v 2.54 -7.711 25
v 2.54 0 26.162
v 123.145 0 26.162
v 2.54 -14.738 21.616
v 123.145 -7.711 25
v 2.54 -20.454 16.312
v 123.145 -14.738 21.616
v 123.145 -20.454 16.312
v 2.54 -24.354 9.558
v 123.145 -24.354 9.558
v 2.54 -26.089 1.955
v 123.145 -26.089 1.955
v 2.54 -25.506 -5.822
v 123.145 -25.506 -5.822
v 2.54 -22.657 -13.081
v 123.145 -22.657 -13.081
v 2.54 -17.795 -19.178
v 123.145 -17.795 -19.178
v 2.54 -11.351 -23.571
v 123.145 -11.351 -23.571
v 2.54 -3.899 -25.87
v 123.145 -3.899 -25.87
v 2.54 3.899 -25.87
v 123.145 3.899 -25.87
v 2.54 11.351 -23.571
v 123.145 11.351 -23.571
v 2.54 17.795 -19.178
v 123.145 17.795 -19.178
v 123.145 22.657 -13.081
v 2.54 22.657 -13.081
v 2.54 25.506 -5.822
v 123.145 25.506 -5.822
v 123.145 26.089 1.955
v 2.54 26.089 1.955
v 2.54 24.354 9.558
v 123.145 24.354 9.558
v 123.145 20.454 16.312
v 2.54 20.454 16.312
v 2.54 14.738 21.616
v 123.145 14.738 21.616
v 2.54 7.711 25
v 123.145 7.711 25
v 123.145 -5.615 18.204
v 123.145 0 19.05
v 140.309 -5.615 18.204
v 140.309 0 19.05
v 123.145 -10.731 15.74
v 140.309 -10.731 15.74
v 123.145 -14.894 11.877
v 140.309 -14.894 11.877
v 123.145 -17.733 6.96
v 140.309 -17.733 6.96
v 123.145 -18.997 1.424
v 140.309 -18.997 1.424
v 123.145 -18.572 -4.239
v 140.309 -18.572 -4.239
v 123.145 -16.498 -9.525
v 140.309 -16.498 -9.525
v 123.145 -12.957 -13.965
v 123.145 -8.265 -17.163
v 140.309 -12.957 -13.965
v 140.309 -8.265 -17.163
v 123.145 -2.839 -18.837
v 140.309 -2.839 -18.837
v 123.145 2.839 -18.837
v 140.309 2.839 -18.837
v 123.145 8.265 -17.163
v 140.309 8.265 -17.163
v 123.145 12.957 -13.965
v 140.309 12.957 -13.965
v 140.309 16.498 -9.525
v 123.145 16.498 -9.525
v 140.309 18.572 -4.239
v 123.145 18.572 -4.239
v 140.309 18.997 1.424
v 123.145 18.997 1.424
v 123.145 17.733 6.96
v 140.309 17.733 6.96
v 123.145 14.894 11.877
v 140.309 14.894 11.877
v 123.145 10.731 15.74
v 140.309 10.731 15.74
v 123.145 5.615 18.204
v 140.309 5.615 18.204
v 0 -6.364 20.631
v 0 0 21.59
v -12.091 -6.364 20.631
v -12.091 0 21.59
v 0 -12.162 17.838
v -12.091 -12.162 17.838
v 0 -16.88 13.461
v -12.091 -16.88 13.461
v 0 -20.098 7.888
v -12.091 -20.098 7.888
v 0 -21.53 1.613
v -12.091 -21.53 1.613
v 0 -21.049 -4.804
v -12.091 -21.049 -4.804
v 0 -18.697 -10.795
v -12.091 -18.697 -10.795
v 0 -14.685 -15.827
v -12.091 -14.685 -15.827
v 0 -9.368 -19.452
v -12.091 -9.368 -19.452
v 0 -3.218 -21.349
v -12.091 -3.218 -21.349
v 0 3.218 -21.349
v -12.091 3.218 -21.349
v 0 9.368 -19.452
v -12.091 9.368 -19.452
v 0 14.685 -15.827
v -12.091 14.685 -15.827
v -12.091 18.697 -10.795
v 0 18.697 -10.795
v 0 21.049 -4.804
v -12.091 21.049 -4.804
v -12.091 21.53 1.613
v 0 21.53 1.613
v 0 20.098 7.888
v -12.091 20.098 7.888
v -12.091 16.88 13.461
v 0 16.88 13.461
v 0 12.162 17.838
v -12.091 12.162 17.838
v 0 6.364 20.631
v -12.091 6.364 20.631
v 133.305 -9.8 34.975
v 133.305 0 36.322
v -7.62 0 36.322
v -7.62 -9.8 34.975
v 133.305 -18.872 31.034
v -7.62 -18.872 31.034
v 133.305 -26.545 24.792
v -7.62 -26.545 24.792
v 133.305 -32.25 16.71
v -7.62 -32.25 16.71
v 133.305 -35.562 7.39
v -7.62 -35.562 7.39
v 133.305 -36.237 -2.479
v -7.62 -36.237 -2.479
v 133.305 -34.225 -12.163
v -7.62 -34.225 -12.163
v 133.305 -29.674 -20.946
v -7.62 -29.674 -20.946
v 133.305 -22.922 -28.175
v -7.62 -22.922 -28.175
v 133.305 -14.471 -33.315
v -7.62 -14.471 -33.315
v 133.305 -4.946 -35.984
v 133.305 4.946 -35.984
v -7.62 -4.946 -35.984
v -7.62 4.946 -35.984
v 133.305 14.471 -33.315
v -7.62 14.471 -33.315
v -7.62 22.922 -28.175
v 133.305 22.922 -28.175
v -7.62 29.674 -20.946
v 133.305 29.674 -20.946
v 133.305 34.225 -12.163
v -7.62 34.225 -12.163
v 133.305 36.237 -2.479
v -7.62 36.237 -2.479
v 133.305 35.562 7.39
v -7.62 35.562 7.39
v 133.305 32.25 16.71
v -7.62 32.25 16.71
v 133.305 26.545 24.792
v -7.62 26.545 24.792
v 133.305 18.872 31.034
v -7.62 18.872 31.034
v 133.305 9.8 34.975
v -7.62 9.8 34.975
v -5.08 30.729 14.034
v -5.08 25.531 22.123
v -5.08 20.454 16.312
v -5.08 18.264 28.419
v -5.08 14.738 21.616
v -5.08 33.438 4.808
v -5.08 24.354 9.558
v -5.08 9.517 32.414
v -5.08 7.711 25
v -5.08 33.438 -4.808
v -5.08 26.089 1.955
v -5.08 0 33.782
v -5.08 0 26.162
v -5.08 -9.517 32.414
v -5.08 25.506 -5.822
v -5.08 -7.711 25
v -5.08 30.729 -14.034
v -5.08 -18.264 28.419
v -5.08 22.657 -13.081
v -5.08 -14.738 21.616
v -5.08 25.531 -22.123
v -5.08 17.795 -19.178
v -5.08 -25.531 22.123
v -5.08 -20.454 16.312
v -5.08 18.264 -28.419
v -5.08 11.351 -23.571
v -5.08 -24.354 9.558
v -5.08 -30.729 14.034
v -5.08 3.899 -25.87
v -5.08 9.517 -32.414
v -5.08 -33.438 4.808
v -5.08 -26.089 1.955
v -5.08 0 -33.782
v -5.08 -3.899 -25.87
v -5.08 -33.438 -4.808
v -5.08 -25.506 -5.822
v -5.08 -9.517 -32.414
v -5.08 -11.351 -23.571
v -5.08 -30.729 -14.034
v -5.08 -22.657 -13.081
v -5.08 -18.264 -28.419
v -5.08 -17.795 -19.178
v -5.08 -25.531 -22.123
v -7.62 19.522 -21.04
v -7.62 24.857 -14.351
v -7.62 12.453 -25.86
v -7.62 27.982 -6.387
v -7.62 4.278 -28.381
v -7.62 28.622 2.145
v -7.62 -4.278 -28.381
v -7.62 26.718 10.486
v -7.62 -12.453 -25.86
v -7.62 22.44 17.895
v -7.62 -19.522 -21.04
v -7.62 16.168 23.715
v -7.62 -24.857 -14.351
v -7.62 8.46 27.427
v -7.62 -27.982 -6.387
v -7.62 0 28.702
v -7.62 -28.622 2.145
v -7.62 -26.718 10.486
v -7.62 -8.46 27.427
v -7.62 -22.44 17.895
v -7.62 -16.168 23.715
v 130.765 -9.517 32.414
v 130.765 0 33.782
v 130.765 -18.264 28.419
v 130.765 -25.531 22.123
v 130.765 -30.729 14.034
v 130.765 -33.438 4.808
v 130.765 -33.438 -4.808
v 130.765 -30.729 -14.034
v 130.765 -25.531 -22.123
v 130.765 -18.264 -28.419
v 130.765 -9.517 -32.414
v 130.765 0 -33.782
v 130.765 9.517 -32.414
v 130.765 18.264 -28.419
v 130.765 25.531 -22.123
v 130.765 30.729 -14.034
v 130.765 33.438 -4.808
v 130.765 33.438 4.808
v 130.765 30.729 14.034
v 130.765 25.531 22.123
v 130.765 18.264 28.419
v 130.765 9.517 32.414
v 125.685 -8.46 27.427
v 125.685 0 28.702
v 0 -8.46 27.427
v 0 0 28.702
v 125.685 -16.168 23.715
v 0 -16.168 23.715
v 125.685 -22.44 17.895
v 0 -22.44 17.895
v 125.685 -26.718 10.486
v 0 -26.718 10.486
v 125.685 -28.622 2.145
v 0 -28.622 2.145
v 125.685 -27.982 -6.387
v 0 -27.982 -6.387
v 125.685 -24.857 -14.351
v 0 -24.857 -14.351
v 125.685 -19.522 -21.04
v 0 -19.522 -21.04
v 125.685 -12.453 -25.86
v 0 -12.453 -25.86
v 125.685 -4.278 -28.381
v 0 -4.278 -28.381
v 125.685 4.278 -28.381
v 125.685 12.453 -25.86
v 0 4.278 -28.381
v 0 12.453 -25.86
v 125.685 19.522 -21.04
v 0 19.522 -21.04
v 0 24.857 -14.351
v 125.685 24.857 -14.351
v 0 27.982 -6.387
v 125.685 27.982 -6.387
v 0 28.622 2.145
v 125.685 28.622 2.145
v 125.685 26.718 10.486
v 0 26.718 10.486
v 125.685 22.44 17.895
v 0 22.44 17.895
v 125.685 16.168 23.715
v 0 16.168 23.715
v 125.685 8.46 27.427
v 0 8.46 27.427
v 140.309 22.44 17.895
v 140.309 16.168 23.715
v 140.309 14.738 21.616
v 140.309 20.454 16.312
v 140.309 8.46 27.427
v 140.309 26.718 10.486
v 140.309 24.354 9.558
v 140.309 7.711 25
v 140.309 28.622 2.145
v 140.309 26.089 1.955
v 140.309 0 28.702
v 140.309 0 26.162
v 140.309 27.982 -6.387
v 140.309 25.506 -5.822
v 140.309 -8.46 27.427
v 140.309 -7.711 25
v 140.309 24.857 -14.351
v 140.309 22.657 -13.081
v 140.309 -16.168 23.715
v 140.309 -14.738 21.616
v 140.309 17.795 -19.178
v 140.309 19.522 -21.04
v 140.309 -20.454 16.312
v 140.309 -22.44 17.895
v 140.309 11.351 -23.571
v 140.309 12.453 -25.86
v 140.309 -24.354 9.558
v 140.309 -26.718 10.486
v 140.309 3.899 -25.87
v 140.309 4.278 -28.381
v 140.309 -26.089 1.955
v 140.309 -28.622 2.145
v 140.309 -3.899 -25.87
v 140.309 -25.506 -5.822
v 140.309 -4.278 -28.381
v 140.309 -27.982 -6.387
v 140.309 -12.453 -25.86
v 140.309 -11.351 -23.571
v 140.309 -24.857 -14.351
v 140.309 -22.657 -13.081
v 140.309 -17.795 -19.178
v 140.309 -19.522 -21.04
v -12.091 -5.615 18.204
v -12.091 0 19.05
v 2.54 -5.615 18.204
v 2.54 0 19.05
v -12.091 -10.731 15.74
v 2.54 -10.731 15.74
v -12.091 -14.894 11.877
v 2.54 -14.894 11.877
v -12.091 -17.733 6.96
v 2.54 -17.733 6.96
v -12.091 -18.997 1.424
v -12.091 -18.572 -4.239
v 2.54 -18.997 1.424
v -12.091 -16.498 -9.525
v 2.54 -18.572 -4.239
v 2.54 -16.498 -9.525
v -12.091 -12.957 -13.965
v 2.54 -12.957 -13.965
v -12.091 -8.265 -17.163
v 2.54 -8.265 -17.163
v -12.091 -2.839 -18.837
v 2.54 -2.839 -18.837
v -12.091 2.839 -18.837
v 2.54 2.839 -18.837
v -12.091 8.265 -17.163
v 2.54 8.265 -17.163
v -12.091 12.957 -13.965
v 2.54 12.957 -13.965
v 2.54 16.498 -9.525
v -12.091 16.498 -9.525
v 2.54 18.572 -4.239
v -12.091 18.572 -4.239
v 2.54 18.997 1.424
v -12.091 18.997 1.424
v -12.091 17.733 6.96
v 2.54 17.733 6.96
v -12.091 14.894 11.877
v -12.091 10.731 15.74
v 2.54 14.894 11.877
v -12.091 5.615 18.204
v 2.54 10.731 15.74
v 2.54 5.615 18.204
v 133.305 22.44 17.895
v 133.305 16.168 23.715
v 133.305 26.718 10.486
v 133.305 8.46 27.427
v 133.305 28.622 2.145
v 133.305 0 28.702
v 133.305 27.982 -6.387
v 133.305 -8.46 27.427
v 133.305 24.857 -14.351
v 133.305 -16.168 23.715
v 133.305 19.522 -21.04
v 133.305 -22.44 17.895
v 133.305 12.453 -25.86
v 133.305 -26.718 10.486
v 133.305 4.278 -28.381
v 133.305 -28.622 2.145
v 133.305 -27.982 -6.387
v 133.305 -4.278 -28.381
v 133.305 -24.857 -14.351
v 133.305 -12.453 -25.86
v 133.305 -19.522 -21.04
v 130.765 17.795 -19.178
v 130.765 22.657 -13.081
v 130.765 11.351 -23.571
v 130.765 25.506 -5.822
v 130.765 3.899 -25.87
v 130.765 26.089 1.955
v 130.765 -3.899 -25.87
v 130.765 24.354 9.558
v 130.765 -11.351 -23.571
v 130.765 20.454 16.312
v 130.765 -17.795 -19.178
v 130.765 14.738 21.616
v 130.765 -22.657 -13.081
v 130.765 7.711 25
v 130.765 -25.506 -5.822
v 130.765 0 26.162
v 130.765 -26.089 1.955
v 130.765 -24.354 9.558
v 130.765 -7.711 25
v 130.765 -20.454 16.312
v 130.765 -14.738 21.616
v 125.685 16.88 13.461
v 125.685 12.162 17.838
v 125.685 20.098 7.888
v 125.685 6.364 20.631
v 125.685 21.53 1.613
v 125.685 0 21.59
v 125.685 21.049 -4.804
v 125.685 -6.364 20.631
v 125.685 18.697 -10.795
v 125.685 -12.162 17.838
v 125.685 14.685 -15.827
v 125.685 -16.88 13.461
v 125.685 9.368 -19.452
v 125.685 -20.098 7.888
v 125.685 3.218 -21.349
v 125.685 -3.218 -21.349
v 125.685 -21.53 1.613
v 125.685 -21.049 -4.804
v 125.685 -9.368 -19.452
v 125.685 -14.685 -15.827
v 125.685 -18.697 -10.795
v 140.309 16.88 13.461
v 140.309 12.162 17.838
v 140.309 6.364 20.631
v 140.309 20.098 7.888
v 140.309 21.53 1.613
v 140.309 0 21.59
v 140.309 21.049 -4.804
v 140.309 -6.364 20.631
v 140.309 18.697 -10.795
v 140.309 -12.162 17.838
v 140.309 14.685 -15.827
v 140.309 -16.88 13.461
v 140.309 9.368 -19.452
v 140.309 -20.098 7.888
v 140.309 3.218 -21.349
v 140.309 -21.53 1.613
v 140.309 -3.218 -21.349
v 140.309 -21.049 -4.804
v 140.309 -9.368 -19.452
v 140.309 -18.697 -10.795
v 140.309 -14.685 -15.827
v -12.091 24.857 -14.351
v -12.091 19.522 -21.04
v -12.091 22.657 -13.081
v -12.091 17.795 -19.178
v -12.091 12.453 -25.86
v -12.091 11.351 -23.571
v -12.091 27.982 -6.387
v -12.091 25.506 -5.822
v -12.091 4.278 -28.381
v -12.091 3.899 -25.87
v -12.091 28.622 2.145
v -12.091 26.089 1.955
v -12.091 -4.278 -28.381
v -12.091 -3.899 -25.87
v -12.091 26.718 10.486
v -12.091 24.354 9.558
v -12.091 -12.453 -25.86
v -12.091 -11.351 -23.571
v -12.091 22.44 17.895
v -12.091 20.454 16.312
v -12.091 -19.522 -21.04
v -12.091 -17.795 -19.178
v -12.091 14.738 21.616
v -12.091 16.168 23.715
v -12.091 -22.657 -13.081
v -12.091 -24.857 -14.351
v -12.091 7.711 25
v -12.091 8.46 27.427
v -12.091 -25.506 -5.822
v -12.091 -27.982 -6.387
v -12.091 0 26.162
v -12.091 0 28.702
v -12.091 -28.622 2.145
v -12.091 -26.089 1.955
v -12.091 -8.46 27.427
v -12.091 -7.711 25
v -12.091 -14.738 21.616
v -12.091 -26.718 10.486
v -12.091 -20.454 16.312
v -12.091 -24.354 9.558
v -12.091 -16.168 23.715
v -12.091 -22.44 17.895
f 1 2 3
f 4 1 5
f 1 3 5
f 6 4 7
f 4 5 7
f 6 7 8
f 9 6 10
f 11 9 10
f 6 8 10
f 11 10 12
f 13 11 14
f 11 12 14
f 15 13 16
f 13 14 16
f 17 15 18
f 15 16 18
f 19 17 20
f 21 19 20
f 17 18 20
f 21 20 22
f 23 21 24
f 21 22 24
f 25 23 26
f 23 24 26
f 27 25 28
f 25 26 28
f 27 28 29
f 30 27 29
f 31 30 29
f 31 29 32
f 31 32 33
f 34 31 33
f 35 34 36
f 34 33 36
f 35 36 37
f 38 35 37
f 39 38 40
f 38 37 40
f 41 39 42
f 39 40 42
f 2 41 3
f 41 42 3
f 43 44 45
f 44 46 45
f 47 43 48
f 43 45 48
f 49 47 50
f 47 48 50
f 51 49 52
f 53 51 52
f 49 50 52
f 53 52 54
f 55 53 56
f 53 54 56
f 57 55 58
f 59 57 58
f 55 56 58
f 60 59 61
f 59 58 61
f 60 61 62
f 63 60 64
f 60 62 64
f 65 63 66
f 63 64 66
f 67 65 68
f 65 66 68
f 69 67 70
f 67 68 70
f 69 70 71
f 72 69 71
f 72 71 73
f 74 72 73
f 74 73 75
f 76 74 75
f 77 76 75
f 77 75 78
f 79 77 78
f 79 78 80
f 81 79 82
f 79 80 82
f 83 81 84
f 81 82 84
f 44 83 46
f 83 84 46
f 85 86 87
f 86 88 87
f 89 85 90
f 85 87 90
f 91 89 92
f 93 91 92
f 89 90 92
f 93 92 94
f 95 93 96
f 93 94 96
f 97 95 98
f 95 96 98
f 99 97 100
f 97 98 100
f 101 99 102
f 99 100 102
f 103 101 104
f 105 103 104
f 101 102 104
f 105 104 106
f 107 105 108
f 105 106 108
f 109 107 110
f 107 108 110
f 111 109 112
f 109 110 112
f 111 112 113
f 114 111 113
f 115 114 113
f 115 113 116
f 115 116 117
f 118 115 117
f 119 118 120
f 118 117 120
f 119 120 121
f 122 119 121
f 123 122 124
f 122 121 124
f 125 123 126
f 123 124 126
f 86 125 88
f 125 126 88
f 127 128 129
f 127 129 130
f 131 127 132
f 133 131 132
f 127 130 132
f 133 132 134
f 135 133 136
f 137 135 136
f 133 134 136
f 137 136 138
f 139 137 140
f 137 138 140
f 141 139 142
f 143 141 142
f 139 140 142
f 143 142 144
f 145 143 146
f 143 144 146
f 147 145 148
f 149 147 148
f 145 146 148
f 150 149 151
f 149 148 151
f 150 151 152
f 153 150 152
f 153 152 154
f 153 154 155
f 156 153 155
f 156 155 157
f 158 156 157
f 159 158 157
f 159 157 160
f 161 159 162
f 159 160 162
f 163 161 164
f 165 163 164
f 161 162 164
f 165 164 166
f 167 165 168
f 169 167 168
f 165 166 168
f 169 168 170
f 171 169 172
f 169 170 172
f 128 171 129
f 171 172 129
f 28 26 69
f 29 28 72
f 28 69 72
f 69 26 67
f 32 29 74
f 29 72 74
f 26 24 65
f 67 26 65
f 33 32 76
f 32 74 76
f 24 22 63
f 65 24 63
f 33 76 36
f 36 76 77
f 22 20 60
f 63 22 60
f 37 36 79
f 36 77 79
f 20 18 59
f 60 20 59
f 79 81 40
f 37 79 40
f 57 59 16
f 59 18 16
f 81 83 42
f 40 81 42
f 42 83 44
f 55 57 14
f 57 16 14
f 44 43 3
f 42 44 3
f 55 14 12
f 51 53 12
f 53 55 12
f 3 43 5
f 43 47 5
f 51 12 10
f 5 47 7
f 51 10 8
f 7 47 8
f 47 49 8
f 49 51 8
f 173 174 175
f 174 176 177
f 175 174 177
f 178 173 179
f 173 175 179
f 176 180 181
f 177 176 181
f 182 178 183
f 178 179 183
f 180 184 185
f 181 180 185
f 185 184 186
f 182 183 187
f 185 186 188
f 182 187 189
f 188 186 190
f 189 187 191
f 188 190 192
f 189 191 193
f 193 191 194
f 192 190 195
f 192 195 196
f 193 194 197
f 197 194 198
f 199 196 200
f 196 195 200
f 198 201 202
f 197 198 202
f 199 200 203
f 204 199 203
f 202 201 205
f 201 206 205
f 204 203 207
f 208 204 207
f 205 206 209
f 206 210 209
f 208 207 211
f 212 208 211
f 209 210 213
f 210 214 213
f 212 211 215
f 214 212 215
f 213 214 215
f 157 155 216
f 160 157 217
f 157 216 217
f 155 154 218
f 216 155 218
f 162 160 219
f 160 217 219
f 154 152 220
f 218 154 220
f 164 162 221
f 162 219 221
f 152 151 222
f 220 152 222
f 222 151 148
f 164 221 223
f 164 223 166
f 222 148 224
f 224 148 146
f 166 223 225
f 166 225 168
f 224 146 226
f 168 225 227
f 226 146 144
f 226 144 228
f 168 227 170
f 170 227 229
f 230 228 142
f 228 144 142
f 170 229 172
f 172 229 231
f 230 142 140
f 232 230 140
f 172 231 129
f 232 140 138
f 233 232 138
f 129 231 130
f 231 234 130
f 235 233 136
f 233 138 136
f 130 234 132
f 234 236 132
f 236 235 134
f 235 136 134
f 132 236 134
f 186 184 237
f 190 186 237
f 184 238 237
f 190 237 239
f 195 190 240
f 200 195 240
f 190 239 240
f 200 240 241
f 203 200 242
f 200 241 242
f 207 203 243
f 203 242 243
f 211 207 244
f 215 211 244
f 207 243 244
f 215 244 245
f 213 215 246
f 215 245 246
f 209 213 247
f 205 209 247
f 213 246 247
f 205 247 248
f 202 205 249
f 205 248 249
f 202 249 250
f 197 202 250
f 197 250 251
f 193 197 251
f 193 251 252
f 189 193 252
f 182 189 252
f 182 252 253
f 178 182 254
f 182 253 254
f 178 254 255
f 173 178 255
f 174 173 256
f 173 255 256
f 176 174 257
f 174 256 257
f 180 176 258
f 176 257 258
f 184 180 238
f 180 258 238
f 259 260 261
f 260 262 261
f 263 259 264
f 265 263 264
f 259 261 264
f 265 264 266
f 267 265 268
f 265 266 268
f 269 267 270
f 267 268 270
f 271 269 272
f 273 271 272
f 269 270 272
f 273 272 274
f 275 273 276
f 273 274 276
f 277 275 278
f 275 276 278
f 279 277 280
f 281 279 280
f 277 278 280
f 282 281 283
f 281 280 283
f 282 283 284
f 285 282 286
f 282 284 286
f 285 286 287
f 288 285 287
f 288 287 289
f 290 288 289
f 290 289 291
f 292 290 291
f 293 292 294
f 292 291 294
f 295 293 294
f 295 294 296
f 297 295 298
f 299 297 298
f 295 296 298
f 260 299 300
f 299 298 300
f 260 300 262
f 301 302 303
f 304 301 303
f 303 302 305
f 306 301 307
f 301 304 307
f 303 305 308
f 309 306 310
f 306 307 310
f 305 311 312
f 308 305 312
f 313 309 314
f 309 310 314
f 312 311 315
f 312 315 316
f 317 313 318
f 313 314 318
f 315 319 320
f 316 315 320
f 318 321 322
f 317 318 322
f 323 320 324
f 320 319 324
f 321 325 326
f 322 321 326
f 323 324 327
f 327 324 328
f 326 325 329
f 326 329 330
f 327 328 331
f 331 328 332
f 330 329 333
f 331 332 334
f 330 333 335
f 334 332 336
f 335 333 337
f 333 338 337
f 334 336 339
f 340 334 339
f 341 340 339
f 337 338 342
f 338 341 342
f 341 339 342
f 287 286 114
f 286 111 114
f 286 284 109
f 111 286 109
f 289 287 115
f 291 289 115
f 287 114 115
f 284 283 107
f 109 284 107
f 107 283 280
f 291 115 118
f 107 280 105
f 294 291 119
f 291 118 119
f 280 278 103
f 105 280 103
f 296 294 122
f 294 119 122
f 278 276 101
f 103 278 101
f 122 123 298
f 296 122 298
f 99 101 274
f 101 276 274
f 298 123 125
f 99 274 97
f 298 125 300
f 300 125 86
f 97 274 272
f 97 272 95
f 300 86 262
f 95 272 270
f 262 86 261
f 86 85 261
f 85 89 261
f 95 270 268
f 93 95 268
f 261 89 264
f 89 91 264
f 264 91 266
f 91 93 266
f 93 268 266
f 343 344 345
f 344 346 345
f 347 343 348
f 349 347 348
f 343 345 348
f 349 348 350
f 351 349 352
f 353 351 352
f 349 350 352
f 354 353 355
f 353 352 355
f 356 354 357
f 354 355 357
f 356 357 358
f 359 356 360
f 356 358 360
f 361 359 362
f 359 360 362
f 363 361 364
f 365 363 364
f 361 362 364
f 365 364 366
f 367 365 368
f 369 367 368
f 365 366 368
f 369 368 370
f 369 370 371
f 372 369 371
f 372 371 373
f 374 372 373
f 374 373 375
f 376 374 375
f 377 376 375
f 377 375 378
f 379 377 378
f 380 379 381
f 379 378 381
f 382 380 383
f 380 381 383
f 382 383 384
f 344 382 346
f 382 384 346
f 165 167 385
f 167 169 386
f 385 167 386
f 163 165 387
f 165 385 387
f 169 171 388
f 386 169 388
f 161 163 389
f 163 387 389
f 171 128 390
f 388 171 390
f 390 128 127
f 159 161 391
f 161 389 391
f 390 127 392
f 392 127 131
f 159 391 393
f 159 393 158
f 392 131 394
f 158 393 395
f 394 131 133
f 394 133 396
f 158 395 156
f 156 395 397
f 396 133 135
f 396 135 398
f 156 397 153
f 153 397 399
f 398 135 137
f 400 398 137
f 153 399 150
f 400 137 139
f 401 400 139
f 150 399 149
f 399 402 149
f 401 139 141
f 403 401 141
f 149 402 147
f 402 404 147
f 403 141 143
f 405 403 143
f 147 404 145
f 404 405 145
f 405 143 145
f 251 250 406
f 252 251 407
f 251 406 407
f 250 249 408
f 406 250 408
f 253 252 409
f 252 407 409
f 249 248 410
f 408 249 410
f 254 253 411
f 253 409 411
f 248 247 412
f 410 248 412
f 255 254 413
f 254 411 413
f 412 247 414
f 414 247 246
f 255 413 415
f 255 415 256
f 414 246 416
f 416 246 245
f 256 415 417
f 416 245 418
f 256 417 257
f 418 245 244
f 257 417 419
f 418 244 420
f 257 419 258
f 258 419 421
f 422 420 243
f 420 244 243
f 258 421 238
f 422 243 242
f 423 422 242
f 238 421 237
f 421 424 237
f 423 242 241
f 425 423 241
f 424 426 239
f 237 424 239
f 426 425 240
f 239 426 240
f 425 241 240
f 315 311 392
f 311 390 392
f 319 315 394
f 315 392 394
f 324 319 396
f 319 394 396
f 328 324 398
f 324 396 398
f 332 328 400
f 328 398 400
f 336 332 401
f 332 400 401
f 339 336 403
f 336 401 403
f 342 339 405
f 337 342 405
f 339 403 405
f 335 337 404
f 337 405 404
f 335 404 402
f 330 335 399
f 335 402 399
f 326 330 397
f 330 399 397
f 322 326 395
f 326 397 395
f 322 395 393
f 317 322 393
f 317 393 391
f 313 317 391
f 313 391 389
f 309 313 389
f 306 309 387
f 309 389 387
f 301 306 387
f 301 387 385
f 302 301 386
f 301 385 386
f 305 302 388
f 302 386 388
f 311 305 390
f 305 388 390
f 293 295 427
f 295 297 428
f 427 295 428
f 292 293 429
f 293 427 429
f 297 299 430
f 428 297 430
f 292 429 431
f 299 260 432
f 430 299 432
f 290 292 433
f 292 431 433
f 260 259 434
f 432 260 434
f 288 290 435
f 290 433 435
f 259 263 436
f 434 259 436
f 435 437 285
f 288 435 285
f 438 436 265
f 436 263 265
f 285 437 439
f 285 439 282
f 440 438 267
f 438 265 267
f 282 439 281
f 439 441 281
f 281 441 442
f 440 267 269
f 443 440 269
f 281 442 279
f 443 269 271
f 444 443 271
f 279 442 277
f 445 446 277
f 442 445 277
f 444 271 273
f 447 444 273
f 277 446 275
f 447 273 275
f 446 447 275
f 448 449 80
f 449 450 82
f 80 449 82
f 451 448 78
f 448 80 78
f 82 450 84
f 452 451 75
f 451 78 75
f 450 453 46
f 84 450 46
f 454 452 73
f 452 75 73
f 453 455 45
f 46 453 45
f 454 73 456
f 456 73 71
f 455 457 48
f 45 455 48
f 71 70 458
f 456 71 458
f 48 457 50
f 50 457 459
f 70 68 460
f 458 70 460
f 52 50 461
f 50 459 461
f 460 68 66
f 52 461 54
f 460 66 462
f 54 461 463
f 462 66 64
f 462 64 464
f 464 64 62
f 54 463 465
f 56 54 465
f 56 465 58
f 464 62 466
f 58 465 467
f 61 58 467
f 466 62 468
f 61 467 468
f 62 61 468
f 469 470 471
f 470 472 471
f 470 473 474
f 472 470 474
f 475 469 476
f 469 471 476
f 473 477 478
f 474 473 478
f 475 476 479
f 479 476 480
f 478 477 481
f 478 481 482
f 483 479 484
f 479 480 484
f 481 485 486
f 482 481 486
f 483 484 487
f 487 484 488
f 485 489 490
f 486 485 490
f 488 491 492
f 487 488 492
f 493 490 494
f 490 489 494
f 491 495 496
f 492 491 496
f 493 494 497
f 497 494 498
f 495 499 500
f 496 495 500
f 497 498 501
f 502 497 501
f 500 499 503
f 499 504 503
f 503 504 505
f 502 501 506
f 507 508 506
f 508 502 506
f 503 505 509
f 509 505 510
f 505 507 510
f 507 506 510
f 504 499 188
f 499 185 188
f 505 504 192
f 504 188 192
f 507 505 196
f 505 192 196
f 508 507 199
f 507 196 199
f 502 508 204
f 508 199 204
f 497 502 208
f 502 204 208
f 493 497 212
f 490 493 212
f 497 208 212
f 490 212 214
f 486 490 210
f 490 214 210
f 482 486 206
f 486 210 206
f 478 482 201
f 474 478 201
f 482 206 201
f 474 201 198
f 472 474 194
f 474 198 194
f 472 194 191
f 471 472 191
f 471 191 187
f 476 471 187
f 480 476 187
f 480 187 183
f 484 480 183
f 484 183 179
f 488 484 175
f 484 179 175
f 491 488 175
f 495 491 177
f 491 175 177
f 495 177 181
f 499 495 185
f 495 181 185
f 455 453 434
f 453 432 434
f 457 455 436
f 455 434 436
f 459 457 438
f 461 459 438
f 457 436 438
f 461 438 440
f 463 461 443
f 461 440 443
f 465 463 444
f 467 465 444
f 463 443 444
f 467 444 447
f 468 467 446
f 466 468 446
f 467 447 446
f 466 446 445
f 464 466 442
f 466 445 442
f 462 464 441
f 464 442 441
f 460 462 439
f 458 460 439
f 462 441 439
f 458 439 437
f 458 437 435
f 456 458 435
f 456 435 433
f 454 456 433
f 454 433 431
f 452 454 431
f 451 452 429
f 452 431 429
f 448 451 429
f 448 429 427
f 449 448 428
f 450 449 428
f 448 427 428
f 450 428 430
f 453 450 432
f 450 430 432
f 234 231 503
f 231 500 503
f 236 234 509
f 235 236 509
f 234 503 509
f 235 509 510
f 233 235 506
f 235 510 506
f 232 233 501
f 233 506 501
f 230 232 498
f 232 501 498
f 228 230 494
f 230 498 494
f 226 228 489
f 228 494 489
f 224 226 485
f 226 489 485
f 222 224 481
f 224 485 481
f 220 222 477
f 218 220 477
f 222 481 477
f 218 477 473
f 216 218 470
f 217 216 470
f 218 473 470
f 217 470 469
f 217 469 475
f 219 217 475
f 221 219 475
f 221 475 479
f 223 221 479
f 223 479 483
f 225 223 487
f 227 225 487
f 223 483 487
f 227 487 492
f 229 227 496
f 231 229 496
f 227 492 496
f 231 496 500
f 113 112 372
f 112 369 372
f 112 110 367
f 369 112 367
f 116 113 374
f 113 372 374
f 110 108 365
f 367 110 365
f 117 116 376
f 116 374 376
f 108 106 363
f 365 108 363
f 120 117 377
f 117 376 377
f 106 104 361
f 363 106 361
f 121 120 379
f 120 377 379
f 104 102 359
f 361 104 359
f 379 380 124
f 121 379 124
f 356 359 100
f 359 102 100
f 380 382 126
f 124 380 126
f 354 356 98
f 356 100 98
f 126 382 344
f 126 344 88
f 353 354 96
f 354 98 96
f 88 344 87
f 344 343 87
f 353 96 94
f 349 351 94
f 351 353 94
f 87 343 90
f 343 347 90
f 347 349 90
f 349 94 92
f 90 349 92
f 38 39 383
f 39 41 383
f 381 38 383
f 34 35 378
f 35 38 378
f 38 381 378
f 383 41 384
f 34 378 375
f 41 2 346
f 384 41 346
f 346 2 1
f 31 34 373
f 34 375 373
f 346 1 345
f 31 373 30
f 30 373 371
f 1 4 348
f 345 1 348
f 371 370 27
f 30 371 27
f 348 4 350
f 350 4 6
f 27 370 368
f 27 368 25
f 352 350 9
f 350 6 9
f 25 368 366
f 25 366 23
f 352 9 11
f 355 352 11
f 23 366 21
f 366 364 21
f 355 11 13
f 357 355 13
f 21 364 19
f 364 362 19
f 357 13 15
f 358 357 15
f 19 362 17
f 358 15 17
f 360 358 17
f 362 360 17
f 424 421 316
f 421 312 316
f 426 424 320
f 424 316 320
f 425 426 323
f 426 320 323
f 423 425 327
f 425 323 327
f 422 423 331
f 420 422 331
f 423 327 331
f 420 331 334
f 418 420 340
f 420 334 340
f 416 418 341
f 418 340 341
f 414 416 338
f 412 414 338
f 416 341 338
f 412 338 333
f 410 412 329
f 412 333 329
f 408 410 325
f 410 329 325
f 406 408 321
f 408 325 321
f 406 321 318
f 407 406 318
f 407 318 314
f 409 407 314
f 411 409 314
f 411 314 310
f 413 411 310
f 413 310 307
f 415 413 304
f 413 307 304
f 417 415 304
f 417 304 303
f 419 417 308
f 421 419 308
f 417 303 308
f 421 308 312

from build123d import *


with BuildPart() as part:
    # Sketch1 → Revolve1 (revolve)
    with BuildSketch(Plane.XY, mode=Mode.PRIVATE) as revolve1_sk:
        Polygon((140.309357349, 21.59), (125.68467097, 21.59), (125.68467097, 28.702), (0, 28.702), (0, 21.59), (-12.090642651, 21.59), (-12.090642651, 19.05), (2.54, 19.05), (2.54, 26.162), (123.14467097, 26.162), (123.14467097, 19.05), (140.309357349, 19.05), align=None)
        Polygon((-5.08, 33.782), (130.76467097, 33.782), (130.76467097, 26.162), (140.309357349, 26.162), (140.309357349, 28.702), (133.30467097, 28.702), (133.30467097, 36.322), (-7.62, 36.322), (-7.62, 28.702), (-12.090642651, 28.702), (-12.090642651, 26.162), (-5.08, 26.162), align=None)
    revolve(revolve1_sk.sketch.rotate(Axis((0, 0, 0), (1, 0, 0)), 90), axis=Axis((0, 0, 0), (1, 0, 0)))


solid = part.part
